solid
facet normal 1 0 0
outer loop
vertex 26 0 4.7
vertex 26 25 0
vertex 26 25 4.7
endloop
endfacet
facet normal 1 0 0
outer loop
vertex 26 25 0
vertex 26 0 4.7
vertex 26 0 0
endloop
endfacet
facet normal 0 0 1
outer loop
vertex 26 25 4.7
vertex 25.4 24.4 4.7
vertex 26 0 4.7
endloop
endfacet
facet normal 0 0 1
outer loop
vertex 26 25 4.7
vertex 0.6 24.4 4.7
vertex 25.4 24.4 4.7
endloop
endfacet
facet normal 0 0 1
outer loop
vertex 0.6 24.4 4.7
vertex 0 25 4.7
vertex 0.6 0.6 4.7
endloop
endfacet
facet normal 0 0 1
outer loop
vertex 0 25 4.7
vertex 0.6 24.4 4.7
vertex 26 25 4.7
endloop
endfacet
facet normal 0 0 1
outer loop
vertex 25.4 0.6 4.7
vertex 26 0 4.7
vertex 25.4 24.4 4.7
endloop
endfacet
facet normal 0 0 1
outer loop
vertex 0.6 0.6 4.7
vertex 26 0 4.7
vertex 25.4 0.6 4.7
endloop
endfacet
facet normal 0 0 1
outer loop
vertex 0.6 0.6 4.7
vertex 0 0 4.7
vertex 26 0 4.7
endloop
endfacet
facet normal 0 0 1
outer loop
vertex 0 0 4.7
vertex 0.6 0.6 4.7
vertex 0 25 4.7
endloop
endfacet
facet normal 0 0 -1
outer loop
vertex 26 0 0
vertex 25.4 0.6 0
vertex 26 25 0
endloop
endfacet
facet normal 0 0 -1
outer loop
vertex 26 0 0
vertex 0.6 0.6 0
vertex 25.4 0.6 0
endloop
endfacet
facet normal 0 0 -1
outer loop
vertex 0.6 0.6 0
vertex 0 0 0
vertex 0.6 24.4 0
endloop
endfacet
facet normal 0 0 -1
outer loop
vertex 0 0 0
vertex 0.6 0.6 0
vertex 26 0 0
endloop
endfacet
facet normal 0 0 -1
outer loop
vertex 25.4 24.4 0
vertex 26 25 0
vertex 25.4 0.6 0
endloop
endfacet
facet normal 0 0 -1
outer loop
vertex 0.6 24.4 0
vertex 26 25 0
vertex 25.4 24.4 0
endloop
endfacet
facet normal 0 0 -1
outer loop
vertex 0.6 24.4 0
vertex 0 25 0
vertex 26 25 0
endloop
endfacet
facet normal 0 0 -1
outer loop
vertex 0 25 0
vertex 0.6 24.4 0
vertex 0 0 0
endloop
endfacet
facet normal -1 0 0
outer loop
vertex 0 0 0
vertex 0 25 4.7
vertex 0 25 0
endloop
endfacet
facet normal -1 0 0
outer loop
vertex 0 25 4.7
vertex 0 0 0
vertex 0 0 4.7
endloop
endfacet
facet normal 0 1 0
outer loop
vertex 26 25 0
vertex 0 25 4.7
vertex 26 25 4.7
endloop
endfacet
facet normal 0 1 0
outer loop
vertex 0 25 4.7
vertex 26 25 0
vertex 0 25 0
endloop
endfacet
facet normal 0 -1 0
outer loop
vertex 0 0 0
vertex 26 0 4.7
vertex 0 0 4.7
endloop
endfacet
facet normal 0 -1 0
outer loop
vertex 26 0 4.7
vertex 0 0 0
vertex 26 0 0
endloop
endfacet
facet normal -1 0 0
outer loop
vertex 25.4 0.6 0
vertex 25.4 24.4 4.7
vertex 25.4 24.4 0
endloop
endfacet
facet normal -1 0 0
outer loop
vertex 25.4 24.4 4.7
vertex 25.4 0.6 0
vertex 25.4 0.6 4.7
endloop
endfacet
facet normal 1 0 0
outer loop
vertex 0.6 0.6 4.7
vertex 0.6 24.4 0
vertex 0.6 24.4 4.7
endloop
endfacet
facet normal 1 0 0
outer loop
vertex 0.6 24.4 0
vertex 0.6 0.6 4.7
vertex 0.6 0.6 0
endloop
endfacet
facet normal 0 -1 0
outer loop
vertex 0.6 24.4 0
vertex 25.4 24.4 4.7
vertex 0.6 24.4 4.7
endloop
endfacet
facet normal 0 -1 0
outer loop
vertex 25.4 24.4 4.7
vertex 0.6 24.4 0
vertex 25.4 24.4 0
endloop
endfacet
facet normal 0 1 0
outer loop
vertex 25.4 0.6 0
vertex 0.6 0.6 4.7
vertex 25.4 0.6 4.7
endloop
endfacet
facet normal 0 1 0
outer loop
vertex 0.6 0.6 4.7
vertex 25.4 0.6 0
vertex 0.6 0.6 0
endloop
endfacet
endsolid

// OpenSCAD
$fn = 64;

size = [26, 25, 4.7];

difference() {
  cube(size, center=false);
  // Optional light edge relief (kept minimal to preserve bracket size)
  // Comment out if you want a pure rectangular plate.
  translate([0.6, 0.6, -0.01])
    cube([size[0]-1.2, size[1]-1.2, size[2]+0.02], center=false);
}
